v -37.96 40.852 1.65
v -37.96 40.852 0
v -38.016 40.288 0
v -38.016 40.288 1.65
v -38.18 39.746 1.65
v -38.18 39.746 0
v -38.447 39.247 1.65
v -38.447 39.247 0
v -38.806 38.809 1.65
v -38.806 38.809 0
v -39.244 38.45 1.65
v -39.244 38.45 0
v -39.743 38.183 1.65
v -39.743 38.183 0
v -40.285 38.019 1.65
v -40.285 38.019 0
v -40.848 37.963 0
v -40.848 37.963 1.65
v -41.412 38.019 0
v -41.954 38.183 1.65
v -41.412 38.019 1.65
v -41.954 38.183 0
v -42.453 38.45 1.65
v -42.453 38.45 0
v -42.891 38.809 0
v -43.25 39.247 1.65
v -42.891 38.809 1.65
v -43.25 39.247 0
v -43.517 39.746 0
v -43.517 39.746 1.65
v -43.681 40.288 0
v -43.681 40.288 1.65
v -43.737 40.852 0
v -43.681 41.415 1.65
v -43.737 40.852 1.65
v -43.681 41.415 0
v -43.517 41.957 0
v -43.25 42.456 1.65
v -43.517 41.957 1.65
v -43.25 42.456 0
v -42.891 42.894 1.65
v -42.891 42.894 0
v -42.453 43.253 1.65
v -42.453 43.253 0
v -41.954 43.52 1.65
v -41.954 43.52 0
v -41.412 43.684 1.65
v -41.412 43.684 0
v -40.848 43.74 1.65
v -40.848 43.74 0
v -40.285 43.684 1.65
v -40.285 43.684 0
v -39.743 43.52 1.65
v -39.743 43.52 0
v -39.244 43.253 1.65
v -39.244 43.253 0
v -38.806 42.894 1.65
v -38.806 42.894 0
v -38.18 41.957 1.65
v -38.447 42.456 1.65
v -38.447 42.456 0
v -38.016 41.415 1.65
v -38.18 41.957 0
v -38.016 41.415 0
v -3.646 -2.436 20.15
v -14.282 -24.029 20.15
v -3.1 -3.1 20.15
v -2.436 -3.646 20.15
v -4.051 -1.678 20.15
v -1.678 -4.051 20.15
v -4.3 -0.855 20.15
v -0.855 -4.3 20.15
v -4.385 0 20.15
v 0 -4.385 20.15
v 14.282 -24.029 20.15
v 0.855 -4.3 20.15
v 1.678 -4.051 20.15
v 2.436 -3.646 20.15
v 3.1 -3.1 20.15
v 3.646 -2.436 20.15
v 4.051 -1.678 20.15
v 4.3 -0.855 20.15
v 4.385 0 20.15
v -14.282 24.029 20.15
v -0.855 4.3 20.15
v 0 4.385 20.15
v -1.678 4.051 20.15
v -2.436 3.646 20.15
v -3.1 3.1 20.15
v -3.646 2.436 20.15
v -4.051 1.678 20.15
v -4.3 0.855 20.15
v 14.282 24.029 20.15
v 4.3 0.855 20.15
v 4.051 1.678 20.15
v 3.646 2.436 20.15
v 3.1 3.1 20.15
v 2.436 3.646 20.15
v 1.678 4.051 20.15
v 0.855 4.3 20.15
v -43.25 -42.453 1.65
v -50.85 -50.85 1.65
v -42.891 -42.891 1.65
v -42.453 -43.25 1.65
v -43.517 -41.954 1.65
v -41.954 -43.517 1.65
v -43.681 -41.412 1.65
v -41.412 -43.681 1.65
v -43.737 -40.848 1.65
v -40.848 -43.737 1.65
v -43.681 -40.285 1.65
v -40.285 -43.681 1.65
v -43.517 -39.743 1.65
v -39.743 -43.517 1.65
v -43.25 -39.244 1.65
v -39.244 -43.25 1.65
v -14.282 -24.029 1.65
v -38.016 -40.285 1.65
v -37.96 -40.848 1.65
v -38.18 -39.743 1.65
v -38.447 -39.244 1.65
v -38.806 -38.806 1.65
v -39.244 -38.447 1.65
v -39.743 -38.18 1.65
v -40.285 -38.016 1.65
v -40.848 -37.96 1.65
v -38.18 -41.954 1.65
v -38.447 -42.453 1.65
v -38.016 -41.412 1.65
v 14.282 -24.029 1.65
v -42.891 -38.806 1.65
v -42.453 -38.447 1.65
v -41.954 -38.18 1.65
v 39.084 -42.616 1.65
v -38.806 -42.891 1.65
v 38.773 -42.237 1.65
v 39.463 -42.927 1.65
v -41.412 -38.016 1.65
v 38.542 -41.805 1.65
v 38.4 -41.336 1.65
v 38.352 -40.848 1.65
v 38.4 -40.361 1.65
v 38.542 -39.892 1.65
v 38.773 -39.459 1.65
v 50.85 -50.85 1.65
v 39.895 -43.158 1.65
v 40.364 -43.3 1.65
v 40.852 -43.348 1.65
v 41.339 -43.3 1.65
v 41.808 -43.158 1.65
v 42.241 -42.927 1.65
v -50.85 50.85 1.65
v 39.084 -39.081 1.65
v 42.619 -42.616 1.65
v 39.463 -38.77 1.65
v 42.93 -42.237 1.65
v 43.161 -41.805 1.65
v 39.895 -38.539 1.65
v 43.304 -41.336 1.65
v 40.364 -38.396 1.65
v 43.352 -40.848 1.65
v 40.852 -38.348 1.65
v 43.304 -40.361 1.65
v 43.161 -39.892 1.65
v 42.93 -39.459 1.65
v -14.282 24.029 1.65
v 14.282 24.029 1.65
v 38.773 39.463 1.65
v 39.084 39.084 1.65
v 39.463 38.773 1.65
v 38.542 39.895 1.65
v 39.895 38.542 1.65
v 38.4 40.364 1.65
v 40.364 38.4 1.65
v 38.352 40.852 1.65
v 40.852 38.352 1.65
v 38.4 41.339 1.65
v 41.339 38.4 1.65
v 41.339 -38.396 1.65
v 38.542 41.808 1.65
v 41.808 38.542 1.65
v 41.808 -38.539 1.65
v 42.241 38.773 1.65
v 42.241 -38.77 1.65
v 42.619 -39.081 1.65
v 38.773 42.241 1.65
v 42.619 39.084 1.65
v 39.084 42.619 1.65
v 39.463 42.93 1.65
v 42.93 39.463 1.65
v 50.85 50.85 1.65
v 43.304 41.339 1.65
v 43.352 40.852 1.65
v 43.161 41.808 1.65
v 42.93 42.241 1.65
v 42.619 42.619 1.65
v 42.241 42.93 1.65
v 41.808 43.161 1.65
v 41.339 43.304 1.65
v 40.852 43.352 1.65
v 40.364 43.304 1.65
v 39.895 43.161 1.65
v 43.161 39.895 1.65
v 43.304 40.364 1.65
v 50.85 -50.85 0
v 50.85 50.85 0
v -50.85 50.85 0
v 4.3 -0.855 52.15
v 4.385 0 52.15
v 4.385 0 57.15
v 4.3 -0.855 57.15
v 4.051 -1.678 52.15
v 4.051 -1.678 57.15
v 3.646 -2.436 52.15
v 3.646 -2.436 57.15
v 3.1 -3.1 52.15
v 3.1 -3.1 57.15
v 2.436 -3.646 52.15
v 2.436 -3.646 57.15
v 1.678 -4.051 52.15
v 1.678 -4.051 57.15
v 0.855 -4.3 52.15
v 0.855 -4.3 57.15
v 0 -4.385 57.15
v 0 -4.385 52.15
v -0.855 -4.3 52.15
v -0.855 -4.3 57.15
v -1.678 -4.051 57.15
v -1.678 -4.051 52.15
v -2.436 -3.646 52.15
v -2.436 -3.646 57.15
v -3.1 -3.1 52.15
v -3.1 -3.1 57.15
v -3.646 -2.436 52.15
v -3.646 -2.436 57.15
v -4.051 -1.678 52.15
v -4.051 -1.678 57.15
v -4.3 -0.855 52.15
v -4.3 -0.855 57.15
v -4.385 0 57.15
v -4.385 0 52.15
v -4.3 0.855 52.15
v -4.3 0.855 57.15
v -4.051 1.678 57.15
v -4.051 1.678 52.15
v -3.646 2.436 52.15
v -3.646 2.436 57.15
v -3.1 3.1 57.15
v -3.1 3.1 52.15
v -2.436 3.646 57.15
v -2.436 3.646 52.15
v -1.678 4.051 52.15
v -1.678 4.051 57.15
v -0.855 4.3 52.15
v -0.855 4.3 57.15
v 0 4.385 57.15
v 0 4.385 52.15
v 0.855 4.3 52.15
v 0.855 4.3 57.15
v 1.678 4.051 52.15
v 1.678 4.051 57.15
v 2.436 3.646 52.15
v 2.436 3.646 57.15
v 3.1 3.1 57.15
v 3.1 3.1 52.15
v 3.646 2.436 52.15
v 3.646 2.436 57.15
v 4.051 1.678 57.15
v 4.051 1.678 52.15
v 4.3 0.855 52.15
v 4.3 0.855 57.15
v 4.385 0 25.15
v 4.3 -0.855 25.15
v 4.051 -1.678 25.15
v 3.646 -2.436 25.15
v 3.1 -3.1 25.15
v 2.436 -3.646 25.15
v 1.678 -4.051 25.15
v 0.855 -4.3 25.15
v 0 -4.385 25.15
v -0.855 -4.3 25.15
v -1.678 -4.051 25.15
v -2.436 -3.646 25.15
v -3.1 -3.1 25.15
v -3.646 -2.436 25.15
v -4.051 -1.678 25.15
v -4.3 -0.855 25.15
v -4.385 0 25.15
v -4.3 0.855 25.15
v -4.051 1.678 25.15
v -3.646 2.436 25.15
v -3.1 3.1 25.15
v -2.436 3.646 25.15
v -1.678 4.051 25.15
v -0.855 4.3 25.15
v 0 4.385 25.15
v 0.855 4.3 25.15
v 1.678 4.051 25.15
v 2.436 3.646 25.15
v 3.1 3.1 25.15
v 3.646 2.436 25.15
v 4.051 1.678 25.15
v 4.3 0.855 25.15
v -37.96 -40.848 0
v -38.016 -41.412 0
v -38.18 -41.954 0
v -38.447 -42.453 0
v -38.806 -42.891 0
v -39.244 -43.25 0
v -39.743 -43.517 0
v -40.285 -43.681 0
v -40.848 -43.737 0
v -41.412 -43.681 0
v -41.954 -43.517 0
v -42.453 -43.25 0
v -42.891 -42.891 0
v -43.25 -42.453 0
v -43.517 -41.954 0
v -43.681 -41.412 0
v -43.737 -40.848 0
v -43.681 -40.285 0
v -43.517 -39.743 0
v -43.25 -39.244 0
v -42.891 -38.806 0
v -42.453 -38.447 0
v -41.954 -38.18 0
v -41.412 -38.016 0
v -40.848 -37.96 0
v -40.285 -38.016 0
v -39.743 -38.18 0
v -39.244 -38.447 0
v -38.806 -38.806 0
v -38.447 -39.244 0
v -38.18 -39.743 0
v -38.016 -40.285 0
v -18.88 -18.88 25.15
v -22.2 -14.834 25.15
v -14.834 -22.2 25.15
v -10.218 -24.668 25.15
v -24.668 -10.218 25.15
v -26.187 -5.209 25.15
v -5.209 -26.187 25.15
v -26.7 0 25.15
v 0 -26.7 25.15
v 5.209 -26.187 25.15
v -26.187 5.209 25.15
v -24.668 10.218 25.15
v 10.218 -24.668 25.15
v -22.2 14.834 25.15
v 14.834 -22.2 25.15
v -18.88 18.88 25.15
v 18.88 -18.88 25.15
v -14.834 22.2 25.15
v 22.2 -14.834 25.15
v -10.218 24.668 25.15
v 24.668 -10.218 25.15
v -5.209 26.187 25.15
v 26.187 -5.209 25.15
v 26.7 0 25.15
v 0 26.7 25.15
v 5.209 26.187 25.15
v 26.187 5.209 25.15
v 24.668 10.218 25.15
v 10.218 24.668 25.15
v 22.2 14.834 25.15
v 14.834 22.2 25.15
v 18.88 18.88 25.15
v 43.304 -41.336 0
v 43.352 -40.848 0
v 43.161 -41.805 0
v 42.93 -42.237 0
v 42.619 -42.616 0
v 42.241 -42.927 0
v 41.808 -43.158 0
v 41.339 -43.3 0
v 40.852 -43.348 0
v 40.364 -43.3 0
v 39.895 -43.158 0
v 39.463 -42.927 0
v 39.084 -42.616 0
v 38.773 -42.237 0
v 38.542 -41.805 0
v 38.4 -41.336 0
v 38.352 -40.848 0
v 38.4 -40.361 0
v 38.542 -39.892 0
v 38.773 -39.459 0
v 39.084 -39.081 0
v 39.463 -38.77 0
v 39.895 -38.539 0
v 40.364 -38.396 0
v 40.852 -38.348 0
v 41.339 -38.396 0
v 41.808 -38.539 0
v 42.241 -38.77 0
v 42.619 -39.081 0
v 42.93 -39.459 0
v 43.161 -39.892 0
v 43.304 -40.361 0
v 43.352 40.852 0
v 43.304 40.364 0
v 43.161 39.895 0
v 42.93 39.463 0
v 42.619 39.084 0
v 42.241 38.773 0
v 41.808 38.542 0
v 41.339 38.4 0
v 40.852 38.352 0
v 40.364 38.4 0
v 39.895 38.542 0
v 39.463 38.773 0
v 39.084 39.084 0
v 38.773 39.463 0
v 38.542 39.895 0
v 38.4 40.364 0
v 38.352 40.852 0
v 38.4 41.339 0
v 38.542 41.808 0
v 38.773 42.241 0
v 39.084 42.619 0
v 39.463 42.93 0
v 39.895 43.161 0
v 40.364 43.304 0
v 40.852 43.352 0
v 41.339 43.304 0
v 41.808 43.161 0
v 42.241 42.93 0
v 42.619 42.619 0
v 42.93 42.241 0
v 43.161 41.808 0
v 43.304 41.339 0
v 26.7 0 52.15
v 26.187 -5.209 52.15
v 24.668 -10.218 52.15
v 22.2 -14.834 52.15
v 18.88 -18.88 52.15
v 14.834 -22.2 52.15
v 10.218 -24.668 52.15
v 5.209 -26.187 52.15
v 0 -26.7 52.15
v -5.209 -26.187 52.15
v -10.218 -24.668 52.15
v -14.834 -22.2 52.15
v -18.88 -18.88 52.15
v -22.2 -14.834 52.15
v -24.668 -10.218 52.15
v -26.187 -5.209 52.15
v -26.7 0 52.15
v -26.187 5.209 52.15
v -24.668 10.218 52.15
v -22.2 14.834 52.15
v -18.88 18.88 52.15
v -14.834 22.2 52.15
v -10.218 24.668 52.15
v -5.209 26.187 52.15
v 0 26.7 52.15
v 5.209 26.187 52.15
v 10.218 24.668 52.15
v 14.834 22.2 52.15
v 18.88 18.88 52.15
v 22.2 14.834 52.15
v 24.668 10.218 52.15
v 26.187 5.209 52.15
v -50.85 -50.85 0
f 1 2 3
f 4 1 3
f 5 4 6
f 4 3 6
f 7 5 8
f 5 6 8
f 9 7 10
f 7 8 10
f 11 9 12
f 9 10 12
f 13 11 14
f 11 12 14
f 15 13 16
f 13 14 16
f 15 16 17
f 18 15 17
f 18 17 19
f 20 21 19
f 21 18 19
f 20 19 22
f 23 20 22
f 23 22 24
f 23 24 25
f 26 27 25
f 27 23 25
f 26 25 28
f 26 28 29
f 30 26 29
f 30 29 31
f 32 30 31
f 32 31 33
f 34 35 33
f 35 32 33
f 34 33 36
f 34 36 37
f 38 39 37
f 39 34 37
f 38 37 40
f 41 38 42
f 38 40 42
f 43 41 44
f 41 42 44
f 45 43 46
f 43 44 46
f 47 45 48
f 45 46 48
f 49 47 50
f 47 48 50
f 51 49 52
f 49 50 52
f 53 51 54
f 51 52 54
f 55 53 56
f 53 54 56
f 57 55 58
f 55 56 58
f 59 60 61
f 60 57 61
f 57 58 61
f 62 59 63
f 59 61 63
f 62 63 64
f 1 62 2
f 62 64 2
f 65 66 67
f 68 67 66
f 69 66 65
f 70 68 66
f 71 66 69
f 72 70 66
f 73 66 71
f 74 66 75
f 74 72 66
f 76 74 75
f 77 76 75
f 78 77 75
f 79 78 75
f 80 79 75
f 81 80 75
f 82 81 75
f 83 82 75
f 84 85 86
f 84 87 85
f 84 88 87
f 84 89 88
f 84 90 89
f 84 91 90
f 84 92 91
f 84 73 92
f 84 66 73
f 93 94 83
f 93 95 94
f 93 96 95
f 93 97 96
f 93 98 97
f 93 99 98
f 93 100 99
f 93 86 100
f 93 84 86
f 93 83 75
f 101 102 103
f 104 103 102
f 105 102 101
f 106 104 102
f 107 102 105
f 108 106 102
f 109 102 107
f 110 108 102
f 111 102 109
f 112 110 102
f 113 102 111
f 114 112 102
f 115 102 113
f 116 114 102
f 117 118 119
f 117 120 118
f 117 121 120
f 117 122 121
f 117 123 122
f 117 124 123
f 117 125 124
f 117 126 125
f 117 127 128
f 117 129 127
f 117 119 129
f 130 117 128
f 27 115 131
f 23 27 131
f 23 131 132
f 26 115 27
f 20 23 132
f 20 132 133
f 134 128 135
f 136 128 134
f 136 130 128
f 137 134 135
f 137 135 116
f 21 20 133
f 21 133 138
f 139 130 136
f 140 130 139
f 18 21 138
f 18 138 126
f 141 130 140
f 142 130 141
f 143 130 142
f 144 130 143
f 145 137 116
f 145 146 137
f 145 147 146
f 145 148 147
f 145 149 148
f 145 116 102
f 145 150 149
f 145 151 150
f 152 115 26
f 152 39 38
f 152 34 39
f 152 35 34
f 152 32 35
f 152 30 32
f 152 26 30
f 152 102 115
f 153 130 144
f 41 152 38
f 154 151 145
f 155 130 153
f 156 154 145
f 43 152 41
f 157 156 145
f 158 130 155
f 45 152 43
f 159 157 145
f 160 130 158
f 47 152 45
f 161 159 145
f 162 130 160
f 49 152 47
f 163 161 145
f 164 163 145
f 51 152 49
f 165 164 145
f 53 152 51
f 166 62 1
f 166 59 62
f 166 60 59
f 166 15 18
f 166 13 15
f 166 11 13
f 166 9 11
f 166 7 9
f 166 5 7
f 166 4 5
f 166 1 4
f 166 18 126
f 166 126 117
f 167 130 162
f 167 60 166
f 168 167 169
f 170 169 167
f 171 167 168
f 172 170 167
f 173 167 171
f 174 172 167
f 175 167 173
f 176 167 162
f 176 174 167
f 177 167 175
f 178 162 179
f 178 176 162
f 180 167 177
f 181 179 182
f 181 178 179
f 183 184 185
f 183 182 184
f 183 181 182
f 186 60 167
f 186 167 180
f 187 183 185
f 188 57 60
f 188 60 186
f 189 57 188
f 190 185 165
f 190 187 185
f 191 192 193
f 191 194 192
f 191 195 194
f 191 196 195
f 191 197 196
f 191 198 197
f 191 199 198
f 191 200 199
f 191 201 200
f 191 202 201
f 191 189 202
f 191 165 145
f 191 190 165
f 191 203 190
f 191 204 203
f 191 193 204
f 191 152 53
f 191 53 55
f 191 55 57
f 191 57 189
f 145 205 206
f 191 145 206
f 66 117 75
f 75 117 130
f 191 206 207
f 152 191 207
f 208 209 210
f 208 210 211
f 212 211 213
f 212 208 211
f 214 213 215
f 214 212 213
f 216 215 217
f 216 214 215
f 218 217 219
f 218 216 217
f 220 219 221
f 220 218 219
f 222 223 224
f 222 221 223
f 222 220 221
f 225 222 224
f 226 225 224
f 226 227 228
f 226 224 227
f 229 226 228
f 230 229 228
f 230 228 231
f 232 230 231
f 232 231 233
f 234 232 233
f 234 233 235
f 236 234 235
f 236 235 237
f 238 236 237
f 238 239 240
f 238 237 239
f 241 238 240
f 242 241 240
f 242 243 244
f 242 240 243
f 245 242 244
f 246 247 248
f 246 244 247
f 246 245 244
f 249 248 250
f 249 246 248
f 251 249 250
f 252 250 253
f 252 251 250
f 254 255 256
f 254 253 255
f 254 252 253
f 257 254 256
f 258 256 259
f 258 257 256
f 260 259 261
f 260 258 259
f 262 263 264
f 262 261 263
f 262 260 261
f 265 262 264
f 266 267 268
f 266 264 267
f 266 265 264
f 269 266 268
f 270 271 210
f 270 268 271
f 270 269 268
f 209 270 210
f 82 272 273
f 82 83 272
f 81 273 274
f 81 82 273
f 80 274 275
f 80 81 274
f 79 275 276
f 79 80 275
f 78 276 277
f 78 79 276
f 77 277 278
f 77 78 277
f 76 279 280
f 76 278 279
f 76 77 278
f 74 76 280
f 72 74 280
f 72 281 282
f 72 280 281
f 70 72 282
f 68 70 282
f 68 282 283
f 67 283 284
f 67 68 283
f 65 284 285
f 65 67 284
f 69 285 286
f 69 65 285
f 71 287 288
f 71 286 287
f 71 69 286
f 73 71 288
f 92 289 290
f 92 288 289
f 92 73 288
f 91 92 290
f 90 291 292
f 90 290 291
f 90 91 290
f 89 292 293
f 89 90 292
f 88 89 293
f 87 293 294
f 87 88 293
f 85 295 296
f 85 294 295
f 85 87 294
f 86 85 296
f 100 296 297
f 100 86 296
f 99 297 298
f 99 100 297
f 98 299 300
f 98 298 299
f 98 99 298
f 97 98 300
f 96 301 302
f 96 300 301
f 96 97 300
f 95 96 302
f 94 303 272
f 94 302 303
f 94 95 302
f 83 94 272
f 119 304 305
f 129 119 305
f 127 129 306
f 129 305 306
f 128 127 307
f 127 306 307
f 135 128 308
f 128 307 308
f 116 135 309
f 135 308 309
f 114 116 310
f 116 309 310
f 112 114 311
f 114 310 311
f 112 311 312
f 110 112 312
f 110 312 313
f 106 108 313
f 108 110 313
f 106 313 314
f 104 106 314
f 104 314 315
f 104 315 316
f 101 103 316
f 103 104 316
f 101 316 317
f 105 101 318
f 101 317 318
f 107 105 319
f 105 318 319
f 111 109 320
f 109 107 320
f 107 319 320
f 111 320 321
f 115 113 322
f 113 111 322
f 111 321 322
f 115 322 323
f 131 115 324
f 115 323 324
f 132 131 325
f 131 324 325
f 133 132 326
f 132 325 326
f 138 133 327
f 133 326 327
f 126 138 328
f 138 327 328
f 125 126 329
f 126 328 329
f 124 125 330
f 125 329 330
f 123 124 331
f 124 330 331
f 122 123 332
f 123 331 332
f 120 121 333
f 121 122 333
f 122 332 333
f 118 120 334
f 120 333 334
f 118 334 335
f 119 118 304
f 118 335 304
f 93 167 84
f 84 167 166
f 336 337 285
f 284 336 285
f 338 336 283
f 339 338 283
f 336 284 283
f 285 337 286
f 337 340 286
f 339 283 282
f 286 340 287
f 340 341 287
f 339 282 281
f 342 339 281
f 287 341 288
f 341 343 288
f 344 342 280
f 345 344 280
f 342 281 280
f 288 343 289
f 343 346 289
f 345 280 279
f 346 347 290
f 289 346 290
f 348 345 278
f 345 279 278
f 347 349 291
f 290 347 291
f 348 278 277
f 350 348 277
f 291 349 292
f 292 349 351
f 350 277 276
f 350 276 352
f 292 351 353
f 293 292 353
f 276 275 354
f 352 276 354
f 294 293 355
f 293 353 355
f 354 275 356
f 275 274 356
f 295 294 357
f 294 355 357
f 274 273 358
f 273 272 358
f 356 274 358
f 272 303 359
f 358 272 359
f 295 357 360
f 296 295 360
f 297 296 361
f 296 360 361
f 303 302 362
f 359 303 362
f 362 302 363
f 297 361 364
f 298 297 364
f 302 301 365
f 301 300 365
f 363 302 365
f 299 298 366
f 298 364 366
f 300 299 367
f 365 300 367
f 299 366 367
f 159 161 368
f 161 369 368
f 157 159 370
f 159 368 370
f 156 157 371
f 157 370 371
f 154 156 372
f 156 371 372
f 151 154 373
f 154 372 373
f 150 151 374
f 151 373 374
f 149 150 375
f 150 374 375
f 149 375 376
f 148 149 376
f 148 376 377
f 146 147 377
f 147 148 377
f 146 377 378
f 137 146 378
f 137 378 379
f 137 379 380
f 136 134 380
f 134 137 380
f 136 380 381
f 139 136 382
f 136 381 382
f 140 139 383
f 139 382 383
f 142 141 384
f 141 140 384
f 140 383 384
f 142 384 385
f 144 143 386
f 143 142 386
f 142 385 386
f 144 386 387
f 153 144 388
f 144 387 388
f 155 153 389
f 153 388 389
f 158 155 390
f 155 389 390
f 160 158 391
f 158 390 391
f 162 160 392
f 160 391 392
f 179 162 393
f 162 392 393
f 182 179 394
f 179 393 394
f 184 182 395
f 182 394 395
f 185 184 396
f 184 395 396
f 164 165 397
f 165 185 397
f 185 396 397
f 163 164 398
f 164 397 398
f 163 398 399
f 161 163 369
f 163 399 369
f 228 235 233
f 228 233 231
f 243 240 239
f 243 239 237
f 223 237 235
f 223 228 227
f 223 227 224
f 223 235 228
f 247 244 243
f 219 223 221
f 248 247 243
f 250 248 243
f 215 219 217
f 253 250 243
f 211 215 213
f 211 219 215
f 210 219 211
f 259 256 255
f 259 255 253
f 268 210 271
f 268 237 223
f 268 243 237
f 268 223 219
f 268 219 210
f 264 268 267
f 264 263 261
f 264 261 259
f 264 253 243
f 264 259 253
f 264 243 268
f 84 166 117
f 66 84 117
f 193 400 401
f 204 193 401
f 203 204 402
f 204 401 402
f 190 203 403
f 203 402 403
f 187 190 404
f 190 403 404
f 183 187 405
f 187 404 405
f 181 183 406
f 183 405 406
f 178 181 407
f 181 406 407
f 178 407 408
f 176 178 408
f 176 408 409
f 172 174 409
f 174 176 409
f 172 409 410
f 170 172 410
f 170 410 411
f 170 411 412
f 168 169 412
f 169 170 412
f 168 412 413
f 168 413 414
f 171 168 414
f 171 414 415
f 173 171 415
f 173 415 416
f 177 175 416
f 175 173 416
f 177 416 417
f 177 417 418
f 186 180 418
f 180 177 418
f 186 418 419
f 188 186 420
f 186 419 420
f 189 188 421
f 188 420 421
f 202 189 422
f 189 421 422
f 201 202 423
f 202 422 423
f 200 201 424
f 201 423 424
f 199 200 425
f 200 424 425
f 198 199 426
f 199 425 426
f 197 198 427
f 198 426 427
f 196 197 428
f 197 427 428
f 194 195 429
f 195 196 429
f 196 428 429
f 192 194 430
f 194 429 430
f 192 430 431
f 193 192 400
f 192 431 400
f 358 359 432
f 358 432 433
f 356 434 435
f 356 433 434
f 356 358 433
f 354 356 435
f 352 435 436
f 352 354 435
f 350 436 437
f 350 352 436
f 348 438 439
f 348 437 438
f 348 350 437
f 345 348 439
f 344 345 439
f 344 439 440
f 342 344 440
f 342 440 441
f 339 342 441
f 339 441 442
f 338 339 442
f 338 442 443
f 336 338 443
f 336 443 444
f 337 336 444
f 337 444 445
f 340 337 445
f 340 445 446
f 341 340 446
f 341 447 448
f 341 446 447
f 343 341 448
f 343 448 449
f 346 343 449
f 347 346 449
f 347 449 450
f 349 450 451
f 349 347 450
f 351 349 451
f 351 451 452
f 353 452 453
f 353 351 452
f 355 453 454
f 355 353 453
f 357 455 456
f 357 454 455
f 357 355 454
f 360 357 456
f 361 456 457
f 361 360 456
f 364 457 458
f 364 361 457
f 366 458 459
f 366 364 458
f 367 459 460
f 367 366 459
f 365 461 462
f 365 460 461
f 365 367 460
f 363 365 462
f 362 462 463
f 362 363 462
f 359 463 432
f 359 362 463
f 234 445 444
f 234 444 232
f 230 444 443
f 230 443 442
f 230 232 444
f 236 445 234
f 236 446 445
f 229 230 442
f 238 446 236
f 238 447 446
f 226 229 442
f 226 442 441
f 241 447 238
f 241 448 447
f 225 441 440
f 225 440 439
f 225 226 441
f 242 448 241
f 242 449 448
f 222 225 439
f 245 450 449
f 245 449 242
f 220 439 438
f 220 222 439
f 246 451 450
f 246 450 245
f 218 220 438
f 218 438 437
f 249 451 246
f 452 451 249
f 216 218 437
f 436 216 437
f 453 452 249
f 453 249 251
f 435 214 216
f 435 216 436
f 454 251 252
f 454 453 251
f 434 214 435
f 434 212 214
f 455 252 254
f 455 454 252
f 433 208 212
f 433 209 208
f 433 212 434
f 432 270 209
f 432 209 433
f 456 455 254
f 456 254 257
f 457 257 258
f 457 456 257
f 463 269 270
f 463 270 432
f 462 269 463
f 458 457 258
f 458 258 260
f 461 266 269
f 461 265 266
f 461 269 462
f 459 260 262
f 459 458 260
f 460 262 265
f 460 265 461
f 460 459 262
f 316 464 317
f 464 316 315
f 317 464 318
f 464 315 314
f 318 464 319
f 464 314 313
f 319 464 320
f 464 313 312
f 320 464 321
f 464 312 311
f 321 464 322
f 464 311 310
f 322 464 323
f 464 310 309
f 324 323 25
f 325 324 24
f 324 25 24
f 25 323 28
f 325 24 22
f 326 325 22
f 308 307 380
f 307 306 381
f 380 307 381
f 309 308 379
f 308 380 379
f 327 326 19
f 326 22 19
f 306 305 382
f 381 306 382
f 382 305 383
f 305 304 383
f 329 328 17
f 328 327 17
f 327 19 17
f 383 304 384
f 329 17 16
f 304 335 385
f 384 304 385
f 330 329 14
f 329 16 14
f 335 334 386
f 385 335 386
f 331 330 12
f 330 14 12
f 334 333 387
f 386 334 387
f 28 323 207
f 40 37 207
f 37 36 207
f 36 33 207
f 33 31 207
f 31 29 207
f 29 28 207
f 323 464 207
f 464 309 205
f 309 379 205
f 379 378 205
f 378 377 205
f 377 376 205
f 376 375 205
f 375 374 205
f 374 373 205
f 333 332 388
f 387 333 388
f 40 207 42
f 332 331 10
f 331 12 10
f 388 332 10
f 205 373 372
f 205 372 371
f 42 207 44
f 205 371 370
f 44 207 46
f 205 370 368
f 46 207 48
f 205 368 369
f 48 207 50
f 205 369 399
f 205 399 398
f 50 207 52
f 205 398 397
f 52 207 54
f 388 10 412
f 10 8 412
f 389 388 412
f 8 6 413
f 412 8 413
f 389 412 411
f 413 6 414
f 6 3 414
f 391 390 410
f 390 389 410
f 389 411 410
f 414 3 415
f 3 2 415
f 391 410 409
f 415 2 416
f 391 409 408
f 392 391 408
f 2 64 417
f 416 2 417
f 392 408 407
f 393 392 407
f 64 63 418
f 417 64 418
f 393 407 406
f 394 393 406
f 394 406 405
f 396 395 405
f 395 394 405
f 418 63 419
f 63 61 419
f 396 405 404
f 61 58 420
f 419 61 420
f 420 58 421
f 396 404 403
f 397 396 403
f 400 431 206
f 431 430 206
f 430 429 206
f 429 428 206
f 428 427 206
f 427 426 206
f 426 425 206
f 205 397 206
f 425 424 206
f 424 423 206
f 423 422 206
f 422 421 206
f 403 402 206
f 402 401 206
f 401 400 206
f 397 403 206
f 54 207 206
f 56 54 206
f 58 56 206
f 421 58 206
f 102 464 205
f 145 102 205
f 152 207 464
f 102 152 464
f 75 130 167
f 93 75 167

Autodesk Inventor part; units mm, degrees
ref_plane "YZ Plane" through (0, 0, 0) normal (1, 0, 0) x (0, 1, 0)
ref_plane "XZ Plane" through (0, 0, 0) normal (0, 1, 0) x (-1, 0, 0)
ref_plane "Plano de trabajo1" through (0, 0, 0) normal (0, 0, 1) x (1, 0, 0)
sketch "Boceto1" plane through (0, 0, 0) normal (0, 0, 1) x (1, 0, 0)
  line L0 (50.85, -50.85) -> (50.85, 50.85) projected
  line L1 (50.85, 50.85) -> (-50.85, 50.85) projected
  line L2 (-50.85, 50.85) -> (-50.85, -50.85) projected
  line L3 (-50.85, -50.85) -> (50.85, -50.85) projected
  circle A0 centre (-40.8484, 40.8516) radius 2.8882 projected
  circle A1 centre (40.8516, 40.8516) radius 2.5 projected
  circle A2 centre (-40.8484, -40.8484) radius 2.8882 projected
  circle A3 centre (40.8516, -40.8484) radius 2.5 projected
  point P0 (0, 0)
extrude "Extrusión1" add sketch "Boceto1" along normal blind 1.65
sketch "Boceto2" plane through (0, 0, 1.65) normal (0, 0, 1) x (1, 0, 0)
  line L0 (14.2817, 24.0293) -> (-14.2817, 24.0293)
  line L1 (-14.2817, 24.0293) -> (-14.2817, -24.0293)
  line L2 (-14.2817, -24.0293) -> (14.2817, -24.0293)
  line L3 (14.2817, -24.0293) -> (14.2817, 24.0293)
  line L4 (14.2817, 24.0293) -> (-14.2817, -24.0293) construction
  line L5 (-14.2817, 24.0293) -> (14.2817, -24.0293) construction
  point P0 (0, 0)
extrude "Extrusión2" add sketch "Boceto2" along normal blind 18.5
sketch "Boceto3" plane through (0, 0, 20.15) normal (0, 0, 1) x (1, 0, 0)
  circle A0 centre (0, 0) radius 4.3846
extrude "Extrusión3" add sketch "Boceto3" along normal blind 5
sketch "Boceto4" plane through (0, 0, 25.15) normal (0, 0, 1) x (1, 0, 0)
  circle A0 centre (0, 0) radius 26.7
  dimension "d6" = 53.4
extrude "Extrusión4" add sketch "Boceto4" along normal blind 27
sketch "Boceto5" plane through (0, 0, 52.15) normal (0, 0, 1) x (1, 0, 0)
  circle A0 centre (0, 0) radius 4.3846 projected
extrude "Extrusión5" add sketch "Boceto5" along normal blind 5
properties part number "PCB_RW"
